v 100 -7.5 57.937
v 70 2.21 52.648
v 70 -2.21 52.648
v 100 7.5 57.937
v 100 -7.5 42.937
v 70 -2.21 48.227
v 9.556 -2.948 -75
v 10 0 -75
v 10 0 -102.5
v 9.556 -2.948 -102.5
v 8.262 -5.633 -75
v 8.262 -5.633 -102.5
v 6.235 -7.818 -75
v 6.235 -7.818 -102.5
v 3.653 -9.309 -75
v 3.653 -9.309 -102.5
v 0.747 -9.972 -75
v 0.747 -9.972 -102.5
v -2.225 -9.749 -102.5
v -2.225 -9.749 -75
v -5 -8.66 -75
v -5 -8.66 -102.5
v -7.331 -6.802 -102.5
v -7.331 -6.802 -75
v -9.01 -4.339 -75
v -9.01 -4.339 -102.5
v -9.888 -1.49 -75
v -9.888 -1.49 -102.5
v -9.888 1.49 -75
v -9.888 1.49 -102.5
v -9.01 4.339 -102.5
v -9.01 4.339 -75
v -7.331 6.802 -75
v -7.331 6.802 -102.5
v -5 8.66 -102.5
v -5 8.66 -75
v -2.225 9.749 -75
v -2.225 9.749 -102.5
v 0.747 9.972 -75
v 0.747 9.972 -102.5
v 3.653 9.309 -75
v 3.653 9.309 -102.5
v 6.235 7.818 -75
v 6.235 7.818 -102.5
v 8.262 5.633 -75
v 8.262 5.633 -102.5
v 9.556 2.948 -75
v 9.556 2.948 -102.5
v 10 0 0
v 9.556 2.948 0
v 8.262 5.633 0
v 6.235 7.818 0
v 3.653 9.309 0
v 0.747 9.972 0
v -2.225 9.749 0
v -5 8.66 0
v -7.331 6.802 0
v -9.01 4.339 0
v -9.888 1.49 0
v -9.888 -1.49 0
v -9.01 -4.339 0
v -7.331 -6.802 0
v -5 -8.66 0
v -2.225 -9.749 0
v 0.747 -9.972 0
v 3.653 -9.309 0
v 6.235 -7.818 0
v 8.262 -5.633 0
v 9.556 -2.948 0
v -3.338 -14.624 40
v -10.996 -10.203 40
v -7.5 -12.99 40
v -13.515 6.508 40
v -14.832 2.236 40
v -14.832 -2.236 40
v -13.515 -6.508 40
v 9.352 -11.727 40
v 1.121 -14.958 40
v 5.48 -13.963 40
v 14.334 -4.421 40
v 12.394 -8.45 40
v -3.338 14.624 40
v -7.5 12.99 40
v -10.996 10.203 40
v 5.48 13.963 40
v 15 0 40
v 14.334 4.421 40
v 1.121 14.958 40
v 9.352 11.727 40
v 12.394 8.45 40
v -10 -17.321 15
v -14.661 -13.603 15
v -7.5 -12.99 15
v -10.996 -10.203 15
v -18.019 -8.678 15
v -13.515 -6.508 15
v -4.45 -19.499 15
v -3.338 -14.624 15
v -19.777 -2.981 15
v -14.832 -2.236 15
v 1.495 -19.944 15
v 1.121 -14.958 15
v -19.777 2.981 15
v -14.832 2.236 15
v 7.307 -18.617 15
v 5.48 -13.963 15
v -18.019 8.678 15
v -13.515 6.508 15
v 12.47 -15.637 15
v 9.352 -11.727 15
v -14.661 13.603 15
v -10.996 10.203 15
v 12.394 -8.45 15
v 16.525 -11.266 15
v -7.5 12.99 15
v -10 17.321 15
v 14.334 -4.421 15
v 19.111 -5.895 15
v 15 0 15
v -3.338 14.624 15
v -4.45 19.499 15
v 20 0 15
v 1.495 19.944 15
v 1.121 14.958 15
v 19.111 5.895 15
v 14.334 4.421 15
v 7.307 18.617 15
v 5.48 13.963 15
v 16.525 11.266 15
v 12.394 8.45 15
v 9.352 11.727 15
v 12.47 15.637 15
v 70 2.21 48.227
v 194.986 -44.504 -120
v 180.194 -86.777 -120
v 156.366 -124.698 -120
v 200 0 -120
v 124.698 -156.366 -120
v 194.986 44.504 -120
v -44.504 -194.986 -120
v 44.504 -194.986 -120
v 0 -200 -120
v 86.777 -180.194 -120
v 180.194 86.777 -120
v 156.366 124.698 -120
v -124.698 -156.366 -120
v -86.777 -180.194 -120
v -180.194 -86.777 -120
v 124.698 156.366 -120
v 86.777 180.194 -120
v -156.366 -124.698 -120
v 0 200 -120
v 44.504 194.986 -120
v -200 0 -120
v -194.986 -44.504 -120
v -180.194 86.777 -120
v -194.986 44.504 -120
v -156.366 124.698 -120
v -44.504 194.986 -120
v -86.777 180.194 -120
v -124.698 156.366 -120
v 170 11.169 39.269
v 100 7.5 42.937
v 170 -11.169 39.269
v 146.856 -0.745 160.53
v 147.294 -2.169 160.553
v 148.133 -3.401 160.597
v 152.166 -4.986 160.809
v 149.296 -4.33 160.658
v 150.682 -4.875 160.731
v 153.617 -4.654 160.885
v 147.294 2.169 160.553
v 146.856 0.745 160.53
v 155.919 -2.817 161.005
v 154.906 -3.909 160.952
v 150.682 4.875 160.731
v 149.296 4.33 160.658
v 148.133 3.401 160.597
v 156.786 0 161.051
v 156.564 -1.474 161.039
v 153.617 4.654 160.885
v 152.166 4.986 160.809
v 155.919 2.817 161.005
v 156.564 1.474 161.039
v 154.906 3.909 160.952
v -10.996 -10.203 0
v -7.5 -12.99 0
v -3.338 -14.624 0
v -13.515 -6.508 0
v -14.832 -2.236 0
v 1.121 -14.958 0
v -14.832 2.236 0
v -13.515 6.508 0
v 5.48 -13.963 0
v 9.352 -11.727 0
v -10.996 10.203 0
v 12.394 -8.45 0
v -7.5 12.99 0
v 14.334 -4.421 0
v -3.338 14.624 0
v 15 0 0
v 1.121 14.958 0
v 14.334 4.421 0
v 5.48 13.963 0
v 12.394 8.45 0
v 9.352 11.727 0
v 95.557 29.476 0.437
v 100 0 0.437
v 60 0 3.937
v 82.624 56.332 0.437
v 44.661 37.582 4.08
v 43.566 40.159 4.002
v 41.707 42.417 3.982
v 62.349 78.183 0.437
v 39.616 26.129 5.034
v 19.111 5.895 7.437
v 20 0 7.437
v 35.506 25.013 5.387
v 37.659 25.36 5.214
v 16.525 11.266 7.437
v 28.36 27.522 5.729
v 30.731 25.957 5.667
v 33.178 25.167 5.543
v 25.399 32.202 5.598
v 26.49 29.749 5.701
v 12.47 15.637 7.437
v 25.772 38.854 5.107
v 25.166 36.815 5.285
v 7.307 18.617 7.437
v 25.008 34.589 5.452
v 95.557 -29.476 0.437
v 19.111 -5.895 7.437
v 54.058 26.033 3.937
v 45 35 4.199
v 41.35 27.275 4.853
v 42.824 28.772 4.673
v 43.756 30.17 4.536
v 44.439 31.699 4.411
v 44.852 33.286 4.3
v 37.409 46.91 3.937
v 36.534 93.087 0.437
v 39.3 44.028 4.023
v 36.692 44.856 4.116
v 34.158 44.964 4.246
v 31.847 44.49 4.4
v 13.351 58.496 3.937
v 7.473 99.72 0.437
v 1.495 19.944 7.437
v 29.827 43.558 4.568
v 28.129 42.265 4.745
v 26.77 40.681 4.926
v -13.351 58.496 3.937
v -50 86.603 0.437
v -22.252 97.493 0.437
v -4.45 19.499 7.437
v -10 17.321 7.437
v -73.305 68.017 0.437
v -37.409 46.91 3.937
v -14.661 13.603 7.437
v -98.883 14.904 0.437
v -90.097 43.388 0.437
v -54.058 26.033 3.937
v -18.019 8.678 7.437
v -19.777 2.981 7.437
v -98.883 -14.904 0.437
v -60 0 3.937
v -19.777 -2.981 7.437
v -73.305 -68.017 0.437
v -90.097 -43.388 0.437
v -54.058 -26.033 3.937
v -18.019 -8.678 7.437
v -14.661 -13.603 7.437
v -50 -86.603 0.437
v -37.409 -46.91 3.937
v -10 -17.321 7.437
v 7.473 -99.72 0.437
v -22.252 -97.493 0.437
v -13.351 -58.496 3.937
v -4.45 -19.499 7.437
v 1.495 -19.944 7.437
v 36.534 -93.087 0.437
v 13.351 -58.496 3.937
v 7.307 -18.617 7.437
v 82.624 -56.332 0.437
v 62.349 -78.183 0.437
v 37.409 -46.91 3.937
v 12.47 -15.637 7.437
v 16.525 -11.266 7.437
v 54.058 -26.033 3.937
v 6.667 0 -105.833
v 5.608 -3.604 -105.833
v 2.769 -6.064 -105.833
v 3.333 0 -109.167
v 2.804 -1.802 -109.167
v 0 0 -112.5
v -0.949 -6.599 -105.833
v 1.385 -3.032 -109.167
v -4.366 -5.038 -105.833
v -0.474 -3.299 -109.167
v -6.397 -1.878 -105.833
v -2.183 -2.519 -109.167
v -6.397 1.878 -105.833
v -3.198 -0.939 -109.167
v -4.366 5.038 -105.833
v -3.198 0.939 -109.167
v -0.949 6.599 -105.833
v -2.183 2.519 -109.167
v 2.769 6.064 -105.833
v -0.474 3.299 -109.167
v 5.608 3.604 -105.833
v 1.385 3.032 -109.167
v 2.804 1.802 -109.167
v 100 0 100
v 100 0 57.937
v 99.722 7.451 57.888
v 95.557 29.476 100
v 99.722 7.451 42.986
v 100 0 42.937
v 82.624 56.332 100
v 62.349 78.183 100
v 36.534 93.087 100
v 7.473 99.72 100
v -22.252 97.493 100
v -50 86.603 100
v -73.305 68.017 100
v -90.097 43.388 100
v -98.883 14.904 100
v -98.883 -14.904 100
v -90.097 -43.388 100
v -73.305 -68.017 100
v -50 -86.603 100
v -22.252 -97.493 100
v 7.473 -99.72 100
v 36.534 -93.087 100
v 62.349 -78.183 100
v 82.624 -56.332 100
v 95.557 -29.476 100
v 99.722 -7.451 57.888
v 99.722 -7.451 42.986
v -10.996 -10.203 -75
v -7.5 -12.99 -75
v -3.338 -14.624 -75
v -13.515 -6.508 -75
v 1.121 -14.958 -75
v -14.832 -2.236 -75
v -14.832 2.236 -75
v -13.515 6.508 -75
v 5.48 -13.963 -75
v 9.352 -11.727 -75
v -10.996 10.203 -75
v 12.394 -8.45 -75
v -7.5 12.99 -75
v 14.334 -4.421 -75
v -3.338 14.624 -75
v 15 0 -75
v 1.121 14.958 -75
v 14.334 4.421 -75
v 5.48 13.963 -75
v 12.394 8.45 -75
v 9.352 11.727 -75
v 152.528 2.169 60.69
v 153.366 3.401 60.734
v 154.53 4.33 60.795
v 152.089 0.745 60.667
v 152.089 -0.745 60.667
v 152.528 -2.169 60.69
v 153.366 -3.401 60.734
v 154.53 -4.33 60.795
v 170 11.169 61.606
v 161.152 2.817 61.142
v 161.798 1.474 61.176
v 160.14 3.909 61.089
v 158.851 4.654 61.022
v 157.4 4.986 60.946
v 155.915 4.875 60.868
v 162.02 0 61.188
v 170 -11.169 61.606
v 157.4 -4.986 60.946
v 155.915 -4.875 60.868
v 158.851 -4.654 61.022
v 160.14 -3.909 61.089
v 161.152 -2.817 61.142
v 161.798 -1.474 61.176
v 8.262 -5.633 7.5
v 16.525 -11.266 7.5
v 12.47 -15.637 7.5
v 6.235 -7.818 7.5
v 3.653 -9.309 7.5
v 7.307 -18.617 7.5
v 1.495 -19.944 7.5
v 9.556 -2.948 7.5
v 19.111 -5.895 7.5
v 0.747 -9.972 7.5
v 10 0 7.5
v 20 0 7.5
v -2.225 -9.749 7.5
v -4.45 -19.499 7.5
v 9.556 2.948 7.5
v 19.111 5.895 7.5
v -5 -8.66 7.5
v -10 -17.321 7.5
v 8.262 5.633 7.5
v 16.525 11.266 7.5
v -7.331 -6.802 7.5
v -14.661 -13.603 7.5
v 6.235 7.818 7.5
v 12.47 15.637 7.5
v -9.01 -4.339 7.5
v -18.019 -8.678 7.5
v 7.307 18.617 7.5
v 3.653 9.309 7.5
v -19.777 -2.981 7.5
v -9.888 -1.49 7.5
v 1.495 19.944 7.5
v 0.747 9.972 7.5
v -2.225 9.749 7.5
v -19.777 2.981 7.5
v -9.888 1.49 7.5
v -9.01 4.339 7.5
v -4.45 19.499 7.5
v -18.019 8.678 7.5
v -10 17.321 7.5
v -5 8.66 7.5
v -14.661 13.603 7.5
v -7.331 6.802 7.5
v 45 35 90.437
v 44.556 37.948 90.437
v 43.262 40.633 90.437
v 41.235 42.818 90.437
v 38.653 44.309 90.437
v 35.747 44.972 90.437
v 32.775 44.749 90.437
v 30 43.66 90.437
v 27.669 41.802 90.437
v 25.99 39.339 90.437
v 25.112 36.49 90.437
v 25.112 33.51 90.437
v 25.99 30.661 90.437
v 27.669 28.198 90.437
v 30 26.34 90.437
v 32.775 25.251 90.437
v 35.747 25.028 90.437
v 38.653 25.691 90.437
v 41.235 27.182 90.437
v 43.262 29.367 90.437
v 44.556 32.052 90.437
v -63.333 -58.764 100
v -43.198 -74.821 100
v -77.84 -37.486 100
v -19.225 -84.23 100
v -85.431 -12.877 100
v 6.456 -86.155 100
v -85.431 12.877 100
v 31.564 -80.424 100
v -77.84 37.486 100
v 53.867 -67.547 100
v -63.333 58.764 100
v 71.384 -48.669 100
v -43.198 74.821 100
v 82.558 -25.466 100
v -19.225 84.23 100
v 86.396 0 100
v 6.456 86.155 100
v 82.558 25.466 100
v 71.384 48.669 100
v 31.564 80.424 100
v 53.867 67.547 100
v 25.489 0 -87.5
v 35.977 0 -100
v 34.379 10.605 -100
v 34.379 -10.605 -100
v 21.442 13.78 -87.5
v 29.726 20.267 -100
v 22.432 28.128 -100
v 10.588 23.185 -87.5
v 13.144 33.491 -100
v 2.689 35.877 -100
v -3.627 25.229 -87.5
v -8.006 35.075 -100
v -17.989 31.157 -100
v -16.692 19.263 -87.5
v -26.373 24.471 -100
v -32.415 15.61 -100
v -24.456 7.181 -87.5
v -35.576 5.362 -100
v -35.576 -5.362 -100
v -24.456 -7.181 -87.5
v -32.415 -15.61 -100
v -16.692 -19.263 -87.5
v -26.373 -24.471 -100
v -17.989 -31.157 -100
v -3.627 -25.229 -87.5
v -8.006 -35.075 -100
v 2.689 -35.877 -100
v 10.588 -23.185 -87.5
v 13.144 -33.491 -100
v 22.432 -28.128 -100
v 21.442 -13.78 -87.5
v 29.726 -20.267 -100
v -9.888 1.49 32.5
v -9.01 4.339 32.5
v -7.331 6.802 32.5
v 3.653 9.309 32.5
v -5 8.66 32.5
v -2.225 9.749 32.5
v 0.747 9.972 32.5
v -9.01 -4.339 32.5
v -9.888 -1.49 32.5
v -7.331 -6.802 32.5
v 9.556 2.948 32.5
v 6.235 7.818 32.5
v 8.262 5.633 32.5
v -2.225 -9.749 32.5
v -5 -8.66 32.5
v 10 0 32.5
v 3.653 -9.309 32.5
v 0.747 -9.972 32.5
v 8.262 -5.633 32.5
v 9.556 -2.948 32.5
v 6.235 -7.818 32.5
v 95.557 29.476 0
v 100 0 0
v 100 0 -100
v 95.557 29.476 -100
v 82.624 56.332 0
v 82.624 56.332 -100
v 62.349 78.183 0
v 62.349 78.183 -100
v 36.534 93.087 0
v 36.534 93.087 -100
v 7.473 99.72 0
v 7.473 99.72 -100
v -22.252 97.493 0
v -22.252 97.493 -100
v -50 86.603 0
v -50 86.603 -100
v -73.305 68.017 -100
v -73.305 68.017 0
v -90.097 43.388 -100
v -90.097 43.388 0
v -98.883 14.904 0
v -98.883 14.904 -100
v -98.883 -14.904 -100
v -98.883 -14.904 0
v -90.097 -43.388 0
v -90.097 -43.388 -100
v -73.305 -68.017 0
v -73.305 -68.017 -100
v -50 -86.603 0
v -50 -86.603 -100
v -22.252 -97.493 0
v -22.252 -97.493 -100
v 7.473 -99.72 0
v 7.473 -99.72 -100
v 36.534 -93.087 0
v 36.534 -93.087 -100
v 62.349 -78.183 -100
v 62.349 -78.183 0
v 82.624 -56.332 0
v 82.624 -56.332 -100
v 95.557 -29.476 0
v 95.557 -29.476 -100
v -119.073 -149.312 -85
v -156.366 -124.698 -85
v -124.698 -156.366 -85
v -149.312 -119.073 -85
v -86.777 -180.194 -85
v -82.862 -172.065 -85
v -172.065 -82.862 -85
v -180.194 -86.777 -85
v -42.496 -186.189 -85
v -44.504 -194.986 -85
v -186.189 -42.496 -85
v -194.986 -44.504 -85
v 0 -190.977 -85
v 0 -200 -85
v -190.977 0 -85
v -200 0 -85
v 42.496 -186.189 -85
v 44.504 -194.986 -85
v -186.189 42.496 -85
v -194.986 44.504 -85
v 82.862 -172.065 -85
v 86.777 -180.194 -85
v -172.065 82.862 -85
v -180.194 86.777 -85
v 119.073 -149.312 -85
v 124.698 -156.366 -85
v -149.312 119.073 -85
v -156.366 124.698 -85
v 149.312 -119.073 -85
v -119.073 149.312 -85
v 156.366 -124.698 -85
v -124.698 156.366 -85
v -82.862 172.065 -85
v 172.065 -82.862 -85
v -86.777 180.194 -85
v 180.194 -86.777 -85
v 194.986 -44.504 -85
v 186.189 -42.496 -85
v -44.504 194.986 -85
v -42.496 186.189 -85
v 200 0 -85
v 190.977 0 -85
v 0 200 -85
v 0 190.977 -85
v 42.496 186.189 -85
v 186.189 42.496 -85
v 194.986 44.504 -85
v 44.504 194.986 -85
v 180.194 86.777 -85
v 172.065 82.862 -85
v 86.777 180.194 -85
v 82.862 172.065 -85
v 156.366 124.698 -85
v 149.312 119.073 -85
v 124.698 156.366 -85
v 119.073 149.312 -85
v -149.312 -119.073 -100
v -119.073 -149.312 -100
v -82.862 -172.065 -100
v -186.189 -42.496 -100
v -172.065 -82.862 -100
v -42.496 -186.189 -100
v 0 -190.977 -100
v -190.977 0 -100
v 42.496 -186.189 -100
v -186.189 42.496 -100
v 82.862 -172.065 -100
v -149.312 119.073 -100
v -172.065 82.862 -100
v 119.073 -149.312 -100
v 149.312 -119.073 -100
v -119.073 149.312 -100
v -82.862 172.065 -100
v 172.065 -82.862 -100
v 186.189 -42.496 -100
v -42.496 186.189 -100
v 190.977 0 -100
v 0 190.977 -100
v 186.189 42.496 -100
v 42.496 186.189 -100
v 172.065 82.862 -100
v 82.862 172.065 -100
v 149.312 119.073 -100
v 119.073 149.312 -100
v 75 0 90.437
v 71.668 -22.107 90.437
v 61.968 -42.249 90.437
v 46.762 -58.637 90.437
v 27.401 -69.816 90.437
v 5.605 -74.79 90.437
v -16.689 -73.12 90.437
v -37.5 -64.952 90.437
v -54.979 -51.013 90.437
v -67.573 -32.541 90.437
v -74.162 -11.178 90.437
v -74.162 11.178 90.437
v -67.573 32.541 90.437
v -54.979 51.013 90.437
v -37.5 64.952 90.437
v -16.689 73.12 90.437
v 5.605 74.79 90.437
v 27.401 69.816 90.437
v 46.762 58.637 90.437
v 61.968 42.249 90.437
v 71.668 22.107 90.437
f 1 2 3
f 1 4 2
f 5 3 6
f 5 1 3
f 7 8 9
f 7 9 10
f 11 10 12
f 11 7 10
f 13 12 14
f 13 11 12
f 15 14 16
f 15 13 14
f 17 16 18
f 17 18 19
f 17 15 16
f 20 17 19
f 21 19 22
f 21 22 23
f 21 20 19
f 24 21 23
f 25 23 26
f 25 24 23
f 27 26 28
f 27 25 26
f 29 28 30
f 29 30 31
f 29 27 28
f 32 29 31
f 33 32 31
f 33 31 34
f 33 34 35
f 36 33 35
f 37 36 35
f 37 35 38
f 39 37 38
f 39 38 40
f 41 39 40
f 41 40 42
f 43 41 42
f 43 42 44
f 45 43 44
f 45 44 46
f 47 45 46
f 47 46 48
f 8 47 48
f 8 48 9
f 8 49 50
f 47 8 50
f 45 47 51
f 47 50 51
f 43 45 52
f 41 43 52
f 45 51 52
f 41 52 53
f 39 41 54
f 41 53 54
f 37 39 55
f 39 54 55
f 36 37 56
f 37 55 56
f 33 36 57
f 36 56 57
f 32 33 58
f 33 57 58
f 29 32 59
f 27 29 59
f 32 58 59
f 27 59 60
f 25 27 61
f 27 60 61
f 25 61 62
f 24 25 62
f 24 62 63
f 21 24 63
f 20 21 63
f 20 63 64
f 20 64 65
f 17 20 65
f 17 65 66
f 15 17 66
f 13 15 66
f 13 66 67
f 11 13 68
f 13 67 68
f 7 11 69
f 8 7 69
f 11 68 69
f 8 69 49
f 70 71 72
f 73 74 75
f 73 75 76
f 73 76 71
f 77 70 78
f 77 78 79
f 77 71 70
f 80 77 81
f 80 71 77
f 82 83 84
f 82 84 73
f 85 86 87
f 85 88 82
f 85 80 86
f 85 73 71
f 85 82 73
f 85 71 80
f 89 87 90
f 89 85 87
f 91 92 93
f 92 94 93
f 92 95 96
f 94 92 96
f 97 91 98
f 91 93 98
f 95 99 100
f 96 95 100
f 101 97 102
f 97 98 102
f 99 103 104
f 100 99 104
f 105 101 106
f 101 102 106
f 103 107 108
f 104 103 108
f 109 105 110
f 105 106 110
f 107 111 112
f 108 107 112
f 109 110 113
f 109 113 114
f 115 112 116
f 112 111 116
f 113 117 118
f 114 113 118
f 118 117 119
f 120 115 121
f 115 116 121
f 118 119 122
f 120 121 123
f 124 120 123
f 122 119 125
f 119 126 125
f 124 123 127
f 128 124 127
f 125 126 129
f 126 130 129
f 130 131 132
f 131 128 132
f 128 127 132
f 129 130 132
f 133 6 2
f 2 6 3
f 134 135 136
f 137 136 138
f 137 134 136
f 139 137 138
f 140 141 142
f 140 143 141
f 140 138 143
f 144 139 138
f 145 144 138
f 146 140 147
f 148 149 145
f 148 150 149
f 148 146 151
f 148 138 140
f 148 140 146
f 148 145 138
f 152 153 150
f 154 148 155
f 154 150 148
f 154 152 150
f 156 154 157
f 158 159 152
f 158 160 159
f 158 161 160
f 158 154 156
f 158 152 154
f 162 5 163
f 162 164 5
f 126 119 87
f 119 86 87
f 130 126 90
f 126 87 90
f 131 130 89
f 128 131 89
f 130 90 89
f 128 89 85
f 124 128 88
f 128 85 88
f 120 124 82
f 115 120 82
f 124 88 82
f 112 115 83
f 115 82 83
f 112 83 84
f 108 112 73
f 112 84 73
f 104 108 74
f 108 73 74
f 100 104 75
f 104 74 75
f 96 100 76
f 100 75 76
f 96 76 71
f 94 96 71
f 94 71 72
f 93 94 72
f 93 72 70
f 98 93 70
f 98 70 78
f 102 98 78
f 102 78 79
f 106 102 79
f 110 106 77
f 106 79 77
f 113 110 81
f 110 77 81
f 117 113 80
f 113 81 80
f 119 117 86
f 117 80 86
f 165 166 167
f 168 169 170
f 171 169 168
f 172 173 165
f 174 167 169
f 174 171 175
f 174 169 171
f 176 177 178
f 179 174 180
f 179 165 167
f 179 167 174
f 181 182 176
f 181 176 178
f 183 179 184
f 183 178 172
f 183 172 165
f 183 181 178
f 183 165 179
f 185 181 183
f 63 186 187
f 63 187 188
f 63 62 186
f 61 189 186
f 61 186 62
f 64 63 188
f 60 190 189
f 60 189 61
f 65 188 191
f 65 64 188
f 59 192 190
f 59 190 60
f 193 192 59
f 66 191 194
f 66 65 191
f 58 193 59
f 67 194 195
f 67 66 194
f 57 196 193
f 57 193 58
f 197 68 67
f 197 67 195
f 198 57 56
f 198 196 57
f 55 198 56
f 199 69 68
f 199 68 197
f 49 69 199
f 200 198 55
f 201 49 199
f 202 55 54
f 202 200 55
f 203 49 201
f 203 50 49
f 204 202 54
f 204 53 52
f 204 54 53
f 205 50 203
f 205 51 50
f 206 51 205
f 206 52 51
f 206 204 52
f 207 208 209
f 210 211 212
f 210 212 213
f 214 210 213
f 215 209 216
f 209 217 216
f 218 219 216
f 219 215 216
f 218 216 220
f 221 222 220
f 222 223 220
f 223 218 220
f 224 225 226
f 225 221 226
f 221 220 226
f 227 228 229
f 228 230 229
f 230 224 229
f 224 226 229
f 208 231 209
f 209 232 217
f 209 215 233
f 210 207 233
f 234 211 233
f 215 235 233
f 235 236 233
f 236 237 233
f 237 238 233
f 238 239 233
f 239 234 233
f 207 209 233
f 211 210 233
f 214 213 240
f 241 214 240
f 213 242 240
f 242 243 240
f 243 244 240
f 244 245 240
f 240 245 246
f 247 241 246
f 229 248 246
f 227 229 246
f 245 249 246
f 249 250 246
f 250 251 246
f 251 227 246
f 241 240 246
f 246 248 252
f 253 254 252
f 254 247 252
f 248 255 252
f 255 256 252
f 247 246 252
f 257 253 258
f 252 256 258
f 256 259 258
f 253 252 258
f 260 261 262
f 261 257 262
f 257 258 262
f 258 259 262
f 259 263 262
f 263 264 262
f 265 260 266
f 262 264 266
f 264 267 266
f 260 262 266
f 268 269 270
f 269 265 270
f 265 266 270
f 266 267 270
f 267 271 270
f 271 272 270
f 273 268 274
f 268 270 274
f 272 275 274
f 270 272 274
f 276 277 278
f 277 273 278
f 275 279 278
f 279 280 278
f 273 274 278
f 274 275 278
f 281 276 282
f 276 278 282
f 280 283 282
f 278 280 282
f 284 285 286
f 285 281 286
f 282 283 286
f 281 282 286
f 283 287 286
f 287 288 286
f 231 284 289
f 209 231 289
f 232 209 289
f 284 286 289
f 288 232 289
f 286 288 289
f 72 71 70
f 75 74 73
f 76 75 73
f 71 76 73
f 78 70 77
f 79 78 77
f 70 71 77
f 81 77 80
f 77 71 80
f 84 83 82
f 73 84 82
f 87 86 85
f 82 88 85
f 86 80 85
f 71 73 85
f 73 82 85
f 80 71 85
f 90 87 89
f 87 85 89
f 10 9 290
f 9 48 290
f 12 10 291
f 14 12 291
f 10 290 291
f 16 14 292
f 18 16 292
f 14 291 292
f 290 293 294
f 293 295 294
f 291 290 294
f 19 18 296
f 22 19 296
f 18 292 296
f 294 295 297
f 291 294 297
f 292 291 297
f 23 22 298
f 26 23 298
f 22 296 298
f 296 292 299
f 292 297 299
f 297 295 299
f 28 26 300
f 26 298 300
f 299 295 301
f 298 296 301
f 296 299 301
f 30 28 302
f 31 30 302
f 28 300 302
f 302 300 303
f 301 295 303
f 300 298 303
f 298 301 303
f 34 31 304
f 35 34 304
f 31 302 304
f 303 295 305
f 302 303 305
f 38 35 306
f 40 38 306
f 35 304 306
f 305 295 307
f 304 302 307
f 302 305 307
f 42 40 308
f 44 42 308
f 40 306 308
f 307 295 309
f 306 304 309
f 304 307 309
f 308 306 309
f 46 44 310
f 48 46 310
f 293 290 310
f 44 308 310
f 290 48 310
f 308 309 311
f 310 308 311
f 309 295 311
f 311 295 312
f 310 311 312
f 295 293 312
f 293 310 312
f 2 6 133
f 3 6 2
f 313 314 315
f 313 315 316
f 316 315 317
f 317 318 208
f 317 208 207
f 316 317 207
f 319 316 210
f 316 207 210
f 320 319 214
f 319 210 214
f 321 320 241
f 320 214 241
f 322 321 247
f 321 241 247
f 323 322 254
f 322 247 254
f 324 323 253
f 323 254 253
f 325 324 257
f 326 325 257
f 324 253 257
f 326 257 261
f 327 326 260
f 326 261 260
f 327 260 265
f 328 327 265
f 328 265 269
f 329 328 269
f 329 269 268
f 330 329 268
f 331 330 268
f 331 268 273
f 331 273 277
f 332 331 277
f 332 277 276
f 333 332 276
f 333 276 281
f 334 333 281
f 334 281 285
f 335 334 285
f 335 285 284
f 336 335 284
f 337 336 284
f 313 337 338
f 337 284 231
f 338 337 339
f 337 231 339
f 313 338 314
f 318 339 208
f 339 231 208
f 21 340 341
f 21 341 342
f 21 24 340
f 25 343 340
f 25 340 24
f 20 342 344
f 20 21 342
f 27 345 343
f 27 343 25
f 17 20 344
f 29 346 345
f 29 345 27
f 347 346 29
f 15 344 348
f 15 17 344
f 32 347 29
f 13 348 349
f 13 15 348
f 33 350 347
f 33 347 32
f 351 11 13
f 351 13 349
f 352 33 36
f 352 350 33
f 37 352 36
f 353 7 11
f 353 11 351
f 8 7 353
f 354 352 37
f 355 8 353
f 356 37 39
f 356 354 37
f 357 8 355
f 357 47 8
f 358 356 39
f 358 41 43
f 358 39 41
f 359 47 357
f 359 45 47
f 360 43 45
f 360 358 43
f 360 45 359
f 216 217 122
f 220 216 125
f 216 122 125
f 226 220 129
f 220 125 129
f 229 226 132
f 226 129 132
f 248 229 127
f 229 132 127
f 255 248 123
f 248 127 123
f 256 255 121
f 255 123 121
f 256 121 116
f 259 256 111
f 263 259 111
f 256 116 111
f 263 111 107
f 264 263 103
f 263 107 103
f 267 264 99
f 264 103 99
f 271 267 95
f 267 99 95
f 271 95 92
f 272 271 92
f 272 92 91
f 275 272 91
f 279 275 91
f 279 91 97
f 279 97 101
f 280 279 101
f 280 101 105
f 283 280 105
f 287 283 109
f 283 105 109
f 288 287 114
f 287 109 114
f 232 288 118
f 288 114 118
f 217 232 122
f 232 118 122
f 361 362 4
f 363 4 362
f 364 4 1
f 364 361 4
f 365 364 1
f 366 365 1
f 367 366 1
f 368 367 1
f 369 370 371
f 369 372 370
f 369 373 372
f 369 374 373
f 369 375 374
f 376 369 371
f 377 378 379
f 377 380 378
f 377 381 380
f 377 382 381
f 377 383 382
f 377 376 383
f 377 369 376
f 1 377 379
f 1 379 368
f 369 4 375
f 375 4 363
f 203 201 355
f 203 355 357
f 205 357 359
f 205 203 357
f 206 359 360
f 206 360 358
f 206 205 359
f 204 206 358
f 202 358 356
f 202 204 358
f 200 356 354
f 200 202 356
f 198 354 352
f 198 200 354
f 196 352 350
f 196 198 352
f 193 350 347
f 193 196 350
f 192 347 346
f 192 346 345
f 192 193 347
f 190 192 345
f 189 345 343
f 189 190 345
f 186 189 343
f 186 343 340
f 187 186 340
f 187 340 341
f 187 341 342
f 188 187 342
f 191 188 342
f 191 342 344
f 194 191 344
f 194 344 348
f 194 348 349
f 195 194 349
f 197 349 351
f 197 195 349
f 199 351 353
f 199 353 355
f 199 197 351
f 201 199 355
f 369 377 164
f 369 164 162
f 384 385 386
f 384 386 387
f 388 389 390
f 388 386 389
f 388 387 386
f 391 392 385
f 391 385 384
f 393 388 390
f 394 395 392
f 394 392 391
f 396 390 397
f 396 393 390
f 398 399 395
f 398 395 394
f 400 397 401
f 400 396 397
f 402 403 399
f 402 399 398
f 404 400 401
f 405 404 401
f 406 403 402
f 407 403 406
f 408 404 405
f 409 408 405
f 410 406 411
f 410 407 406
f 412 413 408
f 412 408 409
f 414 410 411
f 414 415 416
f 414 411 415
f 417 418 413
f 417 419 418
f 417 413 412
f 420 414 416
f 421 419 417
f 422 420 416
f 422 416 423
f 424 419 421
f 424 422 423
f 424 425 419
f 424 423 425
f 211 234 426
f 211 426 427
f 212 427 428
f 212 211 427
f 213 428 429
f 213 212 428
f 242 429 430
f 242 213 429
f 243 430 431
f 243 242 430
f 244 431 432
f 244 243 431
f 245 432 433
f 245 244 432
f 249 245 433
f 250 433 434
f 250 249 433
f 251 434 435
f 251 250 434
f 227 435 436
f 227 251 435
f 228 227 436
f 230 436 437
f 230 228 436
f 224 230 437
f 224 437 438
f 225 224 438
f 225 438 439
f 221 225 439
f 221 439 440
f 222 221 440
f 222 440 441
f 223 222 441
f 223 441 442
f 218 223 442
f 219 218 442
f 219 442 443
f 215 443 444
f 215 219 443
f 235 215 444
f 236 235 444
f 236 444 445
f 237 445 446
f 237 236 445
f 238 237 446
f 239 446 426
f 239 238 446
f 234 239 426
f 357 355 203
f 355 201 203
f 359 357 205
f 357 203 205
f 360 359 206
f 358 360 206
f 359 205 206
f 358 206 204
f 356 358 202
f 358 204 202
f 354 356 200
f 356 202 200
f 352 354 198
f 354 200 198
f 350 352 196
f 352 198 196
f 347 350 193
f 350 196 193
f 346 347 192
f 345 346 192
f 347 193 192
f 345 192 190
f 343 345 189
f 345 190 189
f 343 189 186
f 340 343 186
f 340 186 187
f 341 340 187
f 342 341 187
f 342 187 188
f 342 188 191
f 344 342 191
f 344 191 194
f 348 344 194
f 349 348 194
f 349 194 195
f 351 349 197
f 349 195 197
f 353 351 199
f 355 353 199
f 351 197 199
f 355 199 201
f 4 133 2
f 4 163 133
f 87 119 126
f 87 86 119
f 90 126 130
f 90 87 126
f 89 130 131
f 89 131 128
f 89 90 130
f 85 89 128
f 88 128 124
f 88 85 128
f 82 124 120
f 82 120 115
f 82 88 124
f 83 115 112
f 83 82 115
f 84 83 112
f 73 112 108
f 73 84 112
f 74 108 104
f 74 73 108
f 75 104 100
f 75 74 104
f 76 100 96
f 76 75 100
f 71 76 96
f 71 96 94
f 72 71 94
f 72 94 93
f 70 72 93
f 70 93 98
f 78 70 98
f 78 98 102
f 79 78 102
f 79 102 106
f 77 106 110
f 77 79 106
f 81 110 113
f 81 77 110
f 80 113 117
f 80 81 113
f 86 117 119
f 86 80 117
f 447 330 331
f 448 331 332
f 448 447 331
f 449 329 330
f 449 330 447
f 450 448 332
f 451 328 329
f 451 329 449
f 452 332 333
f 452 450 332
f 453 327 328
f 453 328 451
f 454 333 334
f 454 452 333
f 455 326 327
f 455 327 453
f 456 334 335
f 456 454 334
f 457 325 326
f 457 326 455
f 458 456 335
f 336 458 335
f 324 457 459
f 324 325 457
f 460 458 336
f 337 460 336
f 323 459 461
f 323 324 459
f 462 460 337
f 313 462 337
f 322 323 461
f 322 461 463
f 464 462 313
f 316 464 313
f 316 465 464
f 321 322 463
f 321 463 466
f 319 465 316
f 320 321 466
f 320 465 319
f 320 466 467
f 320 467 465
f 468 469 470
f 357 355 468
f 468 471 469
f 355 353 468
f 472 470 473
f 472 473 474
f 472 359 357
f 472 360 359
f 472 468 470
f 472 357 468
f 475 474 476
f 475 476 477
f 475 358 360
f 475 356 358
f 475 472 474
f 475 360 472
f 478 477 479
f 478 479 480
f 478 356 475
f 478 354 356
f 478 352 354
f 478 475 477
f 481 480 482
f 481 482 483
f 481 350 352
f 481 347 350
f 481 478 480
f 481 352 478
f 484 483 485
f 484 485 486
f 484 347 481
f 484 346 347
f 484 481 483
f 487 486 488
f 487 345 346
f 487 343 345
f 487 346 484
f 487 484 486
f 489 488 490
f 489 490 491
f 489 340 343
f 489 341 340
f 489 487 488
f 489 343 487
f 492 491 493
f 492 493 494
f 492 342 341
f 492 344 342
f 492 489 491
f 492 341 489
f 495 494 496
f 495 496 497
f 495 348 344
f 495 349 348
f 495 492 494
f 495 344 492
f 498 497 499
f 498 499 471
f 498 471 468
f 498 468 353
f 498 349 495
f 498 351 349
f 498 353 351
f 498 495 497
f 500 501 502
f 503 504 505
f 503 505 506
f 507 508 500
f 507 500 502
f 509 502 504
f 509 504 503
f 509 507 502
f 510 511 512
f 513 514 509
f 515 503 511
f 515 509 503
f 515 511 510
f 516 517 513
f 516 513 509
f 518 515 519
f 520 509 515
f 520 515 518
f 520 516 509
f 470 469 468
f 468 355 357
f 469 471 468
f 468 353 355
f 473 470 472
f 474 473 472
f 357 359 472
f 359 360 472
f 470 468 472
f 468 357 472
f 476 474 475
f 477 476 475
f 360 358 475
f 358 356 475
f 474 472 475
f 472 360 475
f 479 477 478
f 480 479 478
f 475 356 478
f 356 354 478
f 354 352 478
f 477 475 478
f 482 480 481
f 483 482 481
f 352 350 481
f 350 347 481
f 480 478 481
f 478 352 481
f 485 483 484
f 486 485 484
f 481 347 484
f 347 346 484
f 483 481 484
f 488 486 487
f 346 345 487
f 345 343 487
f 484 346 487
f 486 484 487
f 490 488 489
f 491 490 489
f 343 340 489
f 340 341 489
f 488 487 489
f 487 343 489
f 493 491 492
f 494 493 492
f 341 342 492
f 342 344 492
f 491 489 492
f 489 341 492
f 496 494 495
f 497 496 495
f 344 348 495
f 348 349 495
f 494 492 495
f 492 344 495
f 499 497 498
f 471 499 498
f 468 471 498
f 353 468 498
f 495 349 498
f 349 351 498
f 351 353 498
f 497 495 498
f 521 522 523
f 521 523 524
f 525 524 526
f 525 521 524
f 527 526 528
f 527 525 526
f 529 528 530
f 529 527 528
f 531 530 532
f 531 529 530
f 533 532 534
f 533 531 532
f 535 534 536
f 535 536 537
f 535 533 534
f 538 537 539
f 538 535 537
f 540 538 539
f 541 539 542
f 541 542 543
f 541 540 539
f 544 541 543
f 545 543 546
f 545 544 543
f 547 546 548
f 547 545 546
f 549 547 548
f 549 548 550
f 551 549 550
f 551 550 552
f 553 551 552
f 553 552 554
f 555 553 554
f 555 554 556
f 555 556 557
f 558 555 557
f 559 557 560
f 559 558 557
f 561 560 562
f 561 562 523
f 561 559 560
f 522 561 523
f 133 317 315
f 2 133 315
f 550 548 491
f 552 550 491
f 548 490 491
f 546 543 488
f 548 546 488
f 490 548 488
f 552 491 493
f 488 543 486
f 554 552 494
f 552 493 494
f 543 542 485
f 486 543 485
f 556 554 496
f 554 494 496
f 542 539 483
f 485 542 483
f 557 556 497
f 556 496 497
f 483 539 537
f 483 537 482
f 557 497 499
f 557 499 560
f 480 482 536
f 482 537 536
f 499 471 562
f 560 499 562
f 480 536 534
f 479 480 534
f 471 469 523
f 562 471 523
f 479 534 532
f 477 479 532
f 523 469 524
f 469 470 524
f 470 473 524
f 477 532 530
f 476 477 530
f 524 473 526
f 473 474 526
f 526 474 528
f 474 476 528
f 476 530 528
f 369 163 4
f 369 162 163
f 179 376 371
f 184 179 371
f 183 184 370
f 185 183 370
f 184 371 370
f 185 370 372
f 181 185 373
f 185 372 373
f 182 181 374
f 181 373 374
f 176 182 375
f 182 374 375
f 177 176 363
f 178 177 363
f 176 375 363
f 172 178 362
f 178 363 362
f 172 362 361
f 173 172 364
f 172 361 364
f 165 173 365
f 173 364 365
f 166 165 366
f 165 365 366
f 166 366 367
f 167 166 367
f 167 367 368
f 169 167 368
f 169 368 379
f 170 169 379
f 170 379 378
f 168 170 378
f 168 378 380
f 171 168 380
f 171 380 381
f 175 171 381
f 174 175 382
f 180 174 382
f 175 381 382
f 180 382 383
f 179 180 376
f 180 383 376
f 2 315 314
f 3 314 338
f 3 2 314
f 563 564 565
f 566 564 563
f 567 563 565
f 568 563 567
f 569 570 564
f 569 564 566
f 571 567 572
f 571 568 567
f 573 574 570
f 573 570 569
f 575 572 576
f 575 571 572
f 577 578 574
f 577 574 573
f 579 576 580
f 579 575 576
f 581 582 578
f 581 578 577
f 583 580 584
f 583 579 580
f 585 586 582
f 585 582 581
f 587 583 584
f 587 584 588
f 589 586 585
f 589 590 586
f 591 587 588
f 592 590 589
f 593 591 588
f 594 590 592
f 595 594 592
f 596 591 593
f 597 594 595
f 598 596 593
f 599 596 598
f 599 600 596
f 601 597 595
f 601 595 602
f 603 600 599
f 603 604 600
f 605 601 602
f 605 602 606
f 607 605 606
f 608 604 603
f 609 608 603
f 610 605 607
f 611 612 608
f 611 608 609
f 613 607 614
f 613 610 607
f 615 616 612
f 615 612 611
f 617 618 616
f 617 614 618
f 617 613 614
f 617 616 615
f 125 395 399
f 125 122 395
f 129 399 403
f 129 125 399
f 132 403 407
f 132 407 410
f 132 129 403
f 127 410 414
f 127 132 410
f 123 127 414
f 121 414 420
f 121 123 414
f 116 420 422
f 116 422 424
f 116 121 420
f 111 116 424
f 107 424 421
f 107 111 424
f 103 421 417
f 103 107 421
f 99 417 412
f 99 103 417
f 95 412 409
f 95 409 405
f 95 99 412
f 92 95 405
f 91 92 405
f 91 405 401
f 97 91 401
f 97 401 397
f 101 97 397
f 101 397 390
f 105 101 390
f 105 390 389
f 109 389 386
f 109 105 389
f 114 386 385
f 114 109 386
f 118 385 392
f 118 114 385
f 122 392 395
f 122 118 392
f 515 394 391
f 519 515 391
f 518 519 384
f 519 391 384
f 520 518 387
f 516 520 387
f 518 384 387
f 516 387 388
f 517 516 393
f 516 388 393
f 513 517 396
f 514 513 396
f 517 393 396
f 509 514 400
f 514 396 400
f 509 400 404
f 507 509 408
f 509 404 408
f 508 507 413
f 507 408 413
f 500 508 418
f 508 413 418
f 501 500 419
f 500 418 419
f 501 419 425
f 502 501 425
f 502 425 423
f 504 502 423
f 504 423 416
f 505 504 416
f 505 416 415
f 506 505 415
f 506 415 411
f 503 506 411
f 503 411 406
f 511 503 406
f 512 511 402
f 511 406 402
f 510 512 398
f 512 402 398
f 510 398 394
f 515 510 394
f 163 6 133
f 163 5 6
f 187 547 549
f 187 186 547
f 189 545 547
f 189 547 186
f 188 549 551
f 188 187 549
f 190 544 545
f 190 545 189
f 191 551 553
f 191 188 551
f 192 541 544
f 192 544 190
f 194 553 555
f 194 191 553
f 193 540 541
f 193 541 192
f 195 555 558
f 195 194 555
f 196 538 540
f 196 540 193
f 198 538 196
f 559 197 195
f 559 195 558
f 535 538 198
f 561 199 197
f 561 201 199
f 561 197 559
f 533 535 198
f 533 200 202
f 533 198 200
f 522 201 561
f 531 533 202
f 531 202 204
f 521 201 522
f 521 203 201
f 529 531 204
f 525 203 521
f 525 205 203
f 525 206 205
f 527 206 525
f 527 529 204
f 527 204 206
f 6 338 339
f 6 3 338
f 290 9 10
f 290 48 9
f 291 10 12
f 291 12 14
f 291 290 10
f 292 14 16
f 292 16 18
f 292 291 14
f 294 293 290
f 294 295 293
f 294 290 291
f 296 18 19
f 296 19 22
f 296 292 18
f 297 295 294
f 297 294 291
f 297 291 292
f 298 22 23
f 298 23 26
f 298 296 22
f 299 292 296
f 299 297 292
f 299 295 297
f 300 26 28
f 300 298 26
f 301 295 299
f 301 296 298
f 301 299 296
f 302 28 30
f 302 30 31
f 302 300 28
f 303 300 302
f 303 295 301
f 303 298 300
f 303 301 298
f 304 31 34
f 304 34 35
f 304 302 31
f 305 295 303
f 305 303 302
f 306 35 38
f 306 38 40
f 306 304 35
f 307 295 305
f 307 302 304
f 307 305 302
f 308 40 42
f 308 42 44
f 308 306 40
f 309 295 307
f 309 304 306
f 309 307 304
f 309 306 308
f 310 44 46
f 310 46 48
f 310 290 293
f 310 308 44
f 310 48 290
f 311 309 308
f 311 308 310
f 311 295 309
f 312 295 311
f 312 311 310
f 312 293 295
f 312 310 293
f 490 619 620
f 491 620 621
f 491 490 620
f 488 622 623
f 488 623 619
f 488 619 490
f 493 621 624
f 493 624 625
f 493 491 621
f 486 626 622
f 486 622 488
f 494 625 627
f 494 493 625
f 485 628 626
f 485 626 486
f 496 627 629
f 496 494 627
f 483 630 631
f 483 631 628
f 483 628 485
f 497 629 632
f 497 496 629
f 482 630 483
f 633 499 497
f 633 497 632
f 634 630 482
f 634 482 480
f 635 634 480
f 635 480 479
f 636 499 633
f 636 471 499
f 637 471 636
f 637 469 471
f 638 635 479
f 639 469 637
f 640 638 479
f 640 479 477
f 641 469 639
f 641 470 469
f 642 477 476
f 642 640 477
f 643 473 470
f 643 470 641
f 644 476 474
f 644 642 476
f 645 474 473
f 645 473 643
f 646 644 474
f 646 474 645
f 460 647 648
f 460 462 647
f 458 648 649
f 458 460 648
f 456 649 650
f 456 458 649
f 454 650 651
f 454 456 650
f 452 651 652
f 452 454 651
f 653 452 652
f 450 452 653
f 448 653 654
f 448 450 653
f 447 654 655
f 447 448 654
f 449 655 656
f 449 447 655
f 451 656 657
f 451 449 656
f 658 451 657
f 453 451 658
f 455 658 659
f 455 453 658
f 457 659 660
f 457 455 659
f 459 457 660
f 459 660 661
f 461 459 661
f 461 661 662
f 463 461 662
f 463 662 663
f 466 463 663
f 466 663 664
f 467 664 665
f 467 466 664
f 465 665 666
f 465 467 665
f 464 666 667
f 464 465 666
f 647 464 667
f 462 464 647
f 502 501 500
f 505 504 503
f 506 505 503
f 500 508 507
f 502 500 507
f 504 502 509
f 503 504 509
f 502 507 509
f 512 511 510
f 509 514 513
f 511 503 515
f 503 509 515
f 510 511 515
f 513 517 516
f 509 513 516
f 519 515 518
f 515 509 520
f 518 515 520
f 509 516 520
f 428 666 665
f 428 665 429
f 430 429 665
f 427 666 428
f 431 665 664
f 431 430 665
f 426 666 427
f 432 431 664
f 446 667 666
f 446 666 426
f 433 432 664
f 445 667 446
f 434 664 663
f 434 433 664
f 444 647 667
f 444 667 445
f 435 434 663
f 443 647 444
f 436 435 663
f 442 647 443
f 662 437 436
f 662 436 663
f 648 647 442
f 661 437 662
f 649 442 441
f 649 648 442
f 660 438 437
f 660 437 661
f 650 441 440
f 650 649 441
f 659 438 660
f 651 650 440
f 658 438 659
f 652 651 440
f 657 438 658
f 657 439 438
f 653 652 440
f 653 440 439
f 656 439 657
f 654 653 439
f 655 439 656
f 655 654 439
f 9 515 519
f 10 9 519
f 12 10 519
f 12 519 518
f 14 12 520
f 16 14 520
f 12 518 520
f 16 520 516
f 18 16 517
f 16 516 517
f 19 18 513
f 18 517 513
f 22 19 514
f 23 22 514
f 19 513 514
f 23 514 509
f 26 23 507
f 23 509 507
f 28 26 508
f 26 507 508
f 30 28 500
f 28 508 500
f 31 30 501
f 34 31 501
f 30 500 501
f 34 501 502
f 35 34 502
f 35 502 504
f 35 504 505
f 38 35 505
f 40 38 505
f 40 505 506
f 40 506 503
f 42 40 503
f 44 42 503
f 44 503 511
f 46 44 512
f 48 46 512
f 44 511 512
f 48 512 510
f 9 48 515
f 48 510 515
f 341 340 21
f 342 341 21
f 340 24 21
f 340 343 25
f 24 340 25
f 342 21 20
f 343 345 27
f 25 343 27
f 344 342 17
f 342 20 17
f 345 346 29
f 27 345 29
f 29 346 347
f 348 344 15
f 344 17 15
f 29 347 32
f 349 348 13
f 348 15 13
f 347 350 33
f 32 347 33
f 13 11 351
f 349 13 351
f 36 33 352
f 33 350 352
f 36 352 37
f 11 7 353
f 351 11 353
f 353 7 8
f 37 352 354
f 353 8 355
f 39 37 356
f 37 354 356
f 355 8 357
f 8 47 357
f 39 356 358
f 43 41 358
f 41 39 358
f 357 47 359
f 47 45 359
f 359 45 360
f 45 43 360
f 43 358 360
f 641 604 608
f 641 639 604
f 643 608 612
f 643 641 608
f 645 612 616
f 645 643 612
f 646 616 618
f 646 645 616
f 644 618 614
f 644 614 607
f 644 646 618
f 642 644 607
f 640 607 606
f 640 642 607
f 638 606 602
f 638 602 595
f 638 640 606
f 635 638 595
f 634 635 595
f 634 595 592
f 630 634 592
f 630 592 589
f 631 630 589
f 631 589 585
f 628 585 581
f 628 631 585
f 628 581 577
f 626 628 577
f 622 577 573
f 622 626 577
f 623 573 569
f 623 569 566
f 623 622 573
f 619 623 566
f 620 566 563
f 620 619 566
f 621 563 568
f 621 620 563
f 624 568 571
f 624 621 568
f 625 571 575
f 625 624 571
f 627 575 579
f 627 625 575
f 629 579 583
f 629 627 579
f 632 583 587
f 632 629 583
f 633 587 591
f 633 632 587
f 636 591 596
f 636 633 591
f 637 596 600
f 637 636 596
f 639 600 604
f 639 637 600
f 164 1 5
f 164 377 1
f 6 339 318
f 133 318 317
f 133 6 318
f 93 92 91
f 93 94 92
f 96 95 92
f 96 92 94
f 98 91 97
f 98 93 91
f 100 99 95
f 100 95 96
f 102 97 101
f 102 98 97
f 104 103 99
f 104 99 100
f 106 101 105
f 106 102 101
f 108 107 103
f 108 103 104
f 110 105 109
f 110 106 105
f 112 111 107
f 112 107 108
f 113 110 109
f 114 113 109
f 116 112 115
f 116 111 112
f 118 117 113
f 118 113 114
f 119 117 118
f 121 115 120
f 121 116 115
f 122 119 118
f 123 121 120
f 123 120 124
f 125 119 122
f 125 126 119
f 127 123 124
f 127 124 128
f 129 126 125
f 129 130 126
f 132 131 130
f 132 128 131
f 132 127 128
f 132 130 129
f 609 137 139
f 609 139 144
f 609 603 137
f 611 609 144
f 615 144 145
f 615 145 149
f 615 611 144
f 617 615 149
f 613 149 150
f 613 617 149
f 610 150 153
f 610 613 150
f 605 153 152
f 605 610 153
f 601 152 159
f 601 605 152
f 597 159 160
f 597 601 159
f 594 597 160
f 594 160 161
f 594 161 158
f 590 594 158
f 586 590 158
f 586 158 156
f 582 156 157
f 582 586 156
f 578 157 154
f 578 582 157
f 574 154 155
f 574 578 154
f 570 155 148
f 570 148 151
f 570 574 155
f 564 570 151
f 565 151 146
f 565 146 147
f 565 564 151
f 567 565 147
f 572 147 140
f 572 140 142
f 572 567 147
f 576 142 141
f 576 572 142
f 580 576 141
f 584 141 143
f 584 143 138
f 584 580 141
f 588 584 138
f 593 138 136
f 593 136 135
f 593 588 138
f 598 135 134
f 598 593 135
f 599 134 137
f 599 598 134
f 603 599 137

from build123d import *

# Parameters (mm, degrees)
F0_R       = 100
F0_R_2     = 10
F1_DEPTH   = 100
F6_R       = 100
F7_DEPTH   = 100
F13_W      = 15
F13_H      = 15
F14_DEPTH  = 30
F14_TAPER  = 10
F14_FACE_W = 4.4203811575
F14_FACE_H = 4.4203811575
F15_DEPTH  = 30
F15_TAPER  = -10
F16_DEPTH  = 70
F16_TAPER  = -3
F17_R      = 5
F18_DEPTH  = 100
F21_R      = 10
F22_DEPTH  = 25
F23_R      = 15
F24_DEPTH  = 75
F25_R      = 10
F26_DEPTH  = 75
F27_R      = 10
F28_DEPTH  = 145
F29_SIZE   = 10


with BuildPart() as f1:
    # F0 (on Top) → F1 (new body)
    with BuildSketch(Plane.XY):
        Circle(F0_R)
        with Locations((35, 35)):
            Circle(F0_R_2, mode=Mode.SUBTRACT)
    extrude(amount=F1_DEPTH)

    # F2 (on Front) → F3 (revolve, cut)
    with BuildSketch(Plane.XZ):
        Polygon((15, 40), (0, 40), (0, 0), (20, 0), (20, 15), (15, 15), align=None)
    revolve(axis=Axis((0, 0, 20), (0, 0, 1)), mode=Mode.SUBTRACT)

    # F4 (on Front) → F5 (revolve, cut)
    with BuildSketch(Plane.XZ):
        Polygon((105, 0), (0, 9.1863096702), (0, 0), align=None)
    revolve(axis=Axis((0, 0, 4.5931548351), (0, 0, 1)), mode=Mode.SUBTRACT)

    # F10 (on Front) → F11 (revolve, cut)
    with BuildSketch(Plane.XZ):
        Polygon((0, 100), (0, 90.4374433176), (75, 90.4374433176), (86.3962112806, 100), align=None)
    revolve(axis=Axis((0, 0, 95.2187216588), (0, 0, -1)), mode=Mode.SUBTRACT)

    # F13 (on offset) → F14 (cut)
    with BuildSketch(Plane.YZ.offset(100)):
        with Locations((0, 50.4374433176)):
            Rectangle(F13_W, F13_H)
    extrude(amount=-F14_DEPTH, taper=F14_TAPER, mode=Mode.SUBTRACT)


with BuildPart() as f7:
    # F6 (on Top) → F7 (new body)
    with BuildSketch(Plane.XY):
        Circle(F6_R)
    extrude(amount=-F7_DEPTH)

    # F8 (on Front) → F9 (revolve, cut)
    with BuildSketch(Plane.XZ):
        Polygon((15, 0), (0, 0), (0, -100), (35.9774907794, -100), (15, -75), align=None)
    revolve(axis=Axis((0, 0, -50), (0, 0, 1)), mode=Mode.SUBTRACT)


with BuildPart() as f15:
    # F14_face (on face) → F15 (new body)
    with BuildSketch(Plane(origin=(70, 0, 50.4374433176), x_dir=(0, 1, 0), z_dir=(1, 0, 0))):
        Rectangle(F14_FACE_W, F14_FACE_H)
    extrude(amount=F15_DEPTH, taper=F15_TAPER)

    # F13 (on offset) → F16 (join)
    with BuildSketch(Plane.YZ.offset(100)):
        with Locations((0, 50.4374433176)):
            Rectangle(F13_W, F13_H)
    extrude(amount=F16_DEPTH, taper=F16_TAPER)

    # F17 (on face) → F18 (join)
    with BuildSketch(Plane(origin=(-2.7541507262, 0, 52.552326466), x_dir=(0.9986295348, 0, 0.0523359562), z_dir=(-0.0523359562, 0, 0.9986295348))):
        with Locations((160, 0)):
            Circle(F17_R)
    extrude(amount=F18_DEPTH)


with BuildPart() as f20:
    # F19 (on Front) → F20 (revolve)
    with BuildSketch(Plane.XZ):
        Polygon((15, 40), (0, 40), (0, 7.5), (20, 7.5), (20, 15), (15, 15), align=None)
    revolve(axis=Axis((0, 0, 20), (0, 0, 1)))

    # F21 (on face) → F22 (cut)
    with BuildSketch(Plane(origin=(0, 0, 7.5), x_dir=(1, 0, 0), z_dir=(0, 0, -1))):
        Circle(F21_R)
    extrude(amount=-F22_DEPTH, mode=Mode.SUBTRACT)


with BuildPart() as f24:
    # F23 (on Top) → F24 (new body)
    with BuildSketch(Plane.XY):
        Circle(F23_R)
    extrude(amount=-F24_DEPTH)

    # F25 (on face) → F26 (cut)
    with BuildSketch(Plane.XY):
        Circle(F25_R)
    extrude(amount=-F26_DEPTH, mode=Mode.SUBTRACT)


with BuildPart() as f28:
    # F27 (on face) → F28 (new body)
    with BuildSketch(Plane(origin=(0, 0, 32.5), x_dir=(1, 0, 0), z_dir=(0, 0, -1))):
        Circle(F27_R)
    extrude(amount=F28_DEPTH)

    # F29
    f29_edges = [f28.edges().sort_by_distance(p)[0] for p in [
        (-10, 0, -112.5),
    ]]
    chamfer(f29_edges, length=F29_SIZE)


with BuildPart() as f31:
    # F30 (on Front) → F31 (revolve)
    with BuildSketch(Plane.XZ):
        Polygon((190.9774907794, -85), (190.9774907794, -100), (35.9774907794, -100), (15, -75), (0, -75), (0, -120), (200, -120), (200, -85), align=None)
    revolve(axis=Axis((0, 0, -97.5), (0, 0, 1)))

    # F32: cut F28
    add(f28.part, mode=Mode.SUBTRACT)


solid = Compound([f1.part, f7.part, f15.part, f20.part, f24.part, f28.part, f31.part])
